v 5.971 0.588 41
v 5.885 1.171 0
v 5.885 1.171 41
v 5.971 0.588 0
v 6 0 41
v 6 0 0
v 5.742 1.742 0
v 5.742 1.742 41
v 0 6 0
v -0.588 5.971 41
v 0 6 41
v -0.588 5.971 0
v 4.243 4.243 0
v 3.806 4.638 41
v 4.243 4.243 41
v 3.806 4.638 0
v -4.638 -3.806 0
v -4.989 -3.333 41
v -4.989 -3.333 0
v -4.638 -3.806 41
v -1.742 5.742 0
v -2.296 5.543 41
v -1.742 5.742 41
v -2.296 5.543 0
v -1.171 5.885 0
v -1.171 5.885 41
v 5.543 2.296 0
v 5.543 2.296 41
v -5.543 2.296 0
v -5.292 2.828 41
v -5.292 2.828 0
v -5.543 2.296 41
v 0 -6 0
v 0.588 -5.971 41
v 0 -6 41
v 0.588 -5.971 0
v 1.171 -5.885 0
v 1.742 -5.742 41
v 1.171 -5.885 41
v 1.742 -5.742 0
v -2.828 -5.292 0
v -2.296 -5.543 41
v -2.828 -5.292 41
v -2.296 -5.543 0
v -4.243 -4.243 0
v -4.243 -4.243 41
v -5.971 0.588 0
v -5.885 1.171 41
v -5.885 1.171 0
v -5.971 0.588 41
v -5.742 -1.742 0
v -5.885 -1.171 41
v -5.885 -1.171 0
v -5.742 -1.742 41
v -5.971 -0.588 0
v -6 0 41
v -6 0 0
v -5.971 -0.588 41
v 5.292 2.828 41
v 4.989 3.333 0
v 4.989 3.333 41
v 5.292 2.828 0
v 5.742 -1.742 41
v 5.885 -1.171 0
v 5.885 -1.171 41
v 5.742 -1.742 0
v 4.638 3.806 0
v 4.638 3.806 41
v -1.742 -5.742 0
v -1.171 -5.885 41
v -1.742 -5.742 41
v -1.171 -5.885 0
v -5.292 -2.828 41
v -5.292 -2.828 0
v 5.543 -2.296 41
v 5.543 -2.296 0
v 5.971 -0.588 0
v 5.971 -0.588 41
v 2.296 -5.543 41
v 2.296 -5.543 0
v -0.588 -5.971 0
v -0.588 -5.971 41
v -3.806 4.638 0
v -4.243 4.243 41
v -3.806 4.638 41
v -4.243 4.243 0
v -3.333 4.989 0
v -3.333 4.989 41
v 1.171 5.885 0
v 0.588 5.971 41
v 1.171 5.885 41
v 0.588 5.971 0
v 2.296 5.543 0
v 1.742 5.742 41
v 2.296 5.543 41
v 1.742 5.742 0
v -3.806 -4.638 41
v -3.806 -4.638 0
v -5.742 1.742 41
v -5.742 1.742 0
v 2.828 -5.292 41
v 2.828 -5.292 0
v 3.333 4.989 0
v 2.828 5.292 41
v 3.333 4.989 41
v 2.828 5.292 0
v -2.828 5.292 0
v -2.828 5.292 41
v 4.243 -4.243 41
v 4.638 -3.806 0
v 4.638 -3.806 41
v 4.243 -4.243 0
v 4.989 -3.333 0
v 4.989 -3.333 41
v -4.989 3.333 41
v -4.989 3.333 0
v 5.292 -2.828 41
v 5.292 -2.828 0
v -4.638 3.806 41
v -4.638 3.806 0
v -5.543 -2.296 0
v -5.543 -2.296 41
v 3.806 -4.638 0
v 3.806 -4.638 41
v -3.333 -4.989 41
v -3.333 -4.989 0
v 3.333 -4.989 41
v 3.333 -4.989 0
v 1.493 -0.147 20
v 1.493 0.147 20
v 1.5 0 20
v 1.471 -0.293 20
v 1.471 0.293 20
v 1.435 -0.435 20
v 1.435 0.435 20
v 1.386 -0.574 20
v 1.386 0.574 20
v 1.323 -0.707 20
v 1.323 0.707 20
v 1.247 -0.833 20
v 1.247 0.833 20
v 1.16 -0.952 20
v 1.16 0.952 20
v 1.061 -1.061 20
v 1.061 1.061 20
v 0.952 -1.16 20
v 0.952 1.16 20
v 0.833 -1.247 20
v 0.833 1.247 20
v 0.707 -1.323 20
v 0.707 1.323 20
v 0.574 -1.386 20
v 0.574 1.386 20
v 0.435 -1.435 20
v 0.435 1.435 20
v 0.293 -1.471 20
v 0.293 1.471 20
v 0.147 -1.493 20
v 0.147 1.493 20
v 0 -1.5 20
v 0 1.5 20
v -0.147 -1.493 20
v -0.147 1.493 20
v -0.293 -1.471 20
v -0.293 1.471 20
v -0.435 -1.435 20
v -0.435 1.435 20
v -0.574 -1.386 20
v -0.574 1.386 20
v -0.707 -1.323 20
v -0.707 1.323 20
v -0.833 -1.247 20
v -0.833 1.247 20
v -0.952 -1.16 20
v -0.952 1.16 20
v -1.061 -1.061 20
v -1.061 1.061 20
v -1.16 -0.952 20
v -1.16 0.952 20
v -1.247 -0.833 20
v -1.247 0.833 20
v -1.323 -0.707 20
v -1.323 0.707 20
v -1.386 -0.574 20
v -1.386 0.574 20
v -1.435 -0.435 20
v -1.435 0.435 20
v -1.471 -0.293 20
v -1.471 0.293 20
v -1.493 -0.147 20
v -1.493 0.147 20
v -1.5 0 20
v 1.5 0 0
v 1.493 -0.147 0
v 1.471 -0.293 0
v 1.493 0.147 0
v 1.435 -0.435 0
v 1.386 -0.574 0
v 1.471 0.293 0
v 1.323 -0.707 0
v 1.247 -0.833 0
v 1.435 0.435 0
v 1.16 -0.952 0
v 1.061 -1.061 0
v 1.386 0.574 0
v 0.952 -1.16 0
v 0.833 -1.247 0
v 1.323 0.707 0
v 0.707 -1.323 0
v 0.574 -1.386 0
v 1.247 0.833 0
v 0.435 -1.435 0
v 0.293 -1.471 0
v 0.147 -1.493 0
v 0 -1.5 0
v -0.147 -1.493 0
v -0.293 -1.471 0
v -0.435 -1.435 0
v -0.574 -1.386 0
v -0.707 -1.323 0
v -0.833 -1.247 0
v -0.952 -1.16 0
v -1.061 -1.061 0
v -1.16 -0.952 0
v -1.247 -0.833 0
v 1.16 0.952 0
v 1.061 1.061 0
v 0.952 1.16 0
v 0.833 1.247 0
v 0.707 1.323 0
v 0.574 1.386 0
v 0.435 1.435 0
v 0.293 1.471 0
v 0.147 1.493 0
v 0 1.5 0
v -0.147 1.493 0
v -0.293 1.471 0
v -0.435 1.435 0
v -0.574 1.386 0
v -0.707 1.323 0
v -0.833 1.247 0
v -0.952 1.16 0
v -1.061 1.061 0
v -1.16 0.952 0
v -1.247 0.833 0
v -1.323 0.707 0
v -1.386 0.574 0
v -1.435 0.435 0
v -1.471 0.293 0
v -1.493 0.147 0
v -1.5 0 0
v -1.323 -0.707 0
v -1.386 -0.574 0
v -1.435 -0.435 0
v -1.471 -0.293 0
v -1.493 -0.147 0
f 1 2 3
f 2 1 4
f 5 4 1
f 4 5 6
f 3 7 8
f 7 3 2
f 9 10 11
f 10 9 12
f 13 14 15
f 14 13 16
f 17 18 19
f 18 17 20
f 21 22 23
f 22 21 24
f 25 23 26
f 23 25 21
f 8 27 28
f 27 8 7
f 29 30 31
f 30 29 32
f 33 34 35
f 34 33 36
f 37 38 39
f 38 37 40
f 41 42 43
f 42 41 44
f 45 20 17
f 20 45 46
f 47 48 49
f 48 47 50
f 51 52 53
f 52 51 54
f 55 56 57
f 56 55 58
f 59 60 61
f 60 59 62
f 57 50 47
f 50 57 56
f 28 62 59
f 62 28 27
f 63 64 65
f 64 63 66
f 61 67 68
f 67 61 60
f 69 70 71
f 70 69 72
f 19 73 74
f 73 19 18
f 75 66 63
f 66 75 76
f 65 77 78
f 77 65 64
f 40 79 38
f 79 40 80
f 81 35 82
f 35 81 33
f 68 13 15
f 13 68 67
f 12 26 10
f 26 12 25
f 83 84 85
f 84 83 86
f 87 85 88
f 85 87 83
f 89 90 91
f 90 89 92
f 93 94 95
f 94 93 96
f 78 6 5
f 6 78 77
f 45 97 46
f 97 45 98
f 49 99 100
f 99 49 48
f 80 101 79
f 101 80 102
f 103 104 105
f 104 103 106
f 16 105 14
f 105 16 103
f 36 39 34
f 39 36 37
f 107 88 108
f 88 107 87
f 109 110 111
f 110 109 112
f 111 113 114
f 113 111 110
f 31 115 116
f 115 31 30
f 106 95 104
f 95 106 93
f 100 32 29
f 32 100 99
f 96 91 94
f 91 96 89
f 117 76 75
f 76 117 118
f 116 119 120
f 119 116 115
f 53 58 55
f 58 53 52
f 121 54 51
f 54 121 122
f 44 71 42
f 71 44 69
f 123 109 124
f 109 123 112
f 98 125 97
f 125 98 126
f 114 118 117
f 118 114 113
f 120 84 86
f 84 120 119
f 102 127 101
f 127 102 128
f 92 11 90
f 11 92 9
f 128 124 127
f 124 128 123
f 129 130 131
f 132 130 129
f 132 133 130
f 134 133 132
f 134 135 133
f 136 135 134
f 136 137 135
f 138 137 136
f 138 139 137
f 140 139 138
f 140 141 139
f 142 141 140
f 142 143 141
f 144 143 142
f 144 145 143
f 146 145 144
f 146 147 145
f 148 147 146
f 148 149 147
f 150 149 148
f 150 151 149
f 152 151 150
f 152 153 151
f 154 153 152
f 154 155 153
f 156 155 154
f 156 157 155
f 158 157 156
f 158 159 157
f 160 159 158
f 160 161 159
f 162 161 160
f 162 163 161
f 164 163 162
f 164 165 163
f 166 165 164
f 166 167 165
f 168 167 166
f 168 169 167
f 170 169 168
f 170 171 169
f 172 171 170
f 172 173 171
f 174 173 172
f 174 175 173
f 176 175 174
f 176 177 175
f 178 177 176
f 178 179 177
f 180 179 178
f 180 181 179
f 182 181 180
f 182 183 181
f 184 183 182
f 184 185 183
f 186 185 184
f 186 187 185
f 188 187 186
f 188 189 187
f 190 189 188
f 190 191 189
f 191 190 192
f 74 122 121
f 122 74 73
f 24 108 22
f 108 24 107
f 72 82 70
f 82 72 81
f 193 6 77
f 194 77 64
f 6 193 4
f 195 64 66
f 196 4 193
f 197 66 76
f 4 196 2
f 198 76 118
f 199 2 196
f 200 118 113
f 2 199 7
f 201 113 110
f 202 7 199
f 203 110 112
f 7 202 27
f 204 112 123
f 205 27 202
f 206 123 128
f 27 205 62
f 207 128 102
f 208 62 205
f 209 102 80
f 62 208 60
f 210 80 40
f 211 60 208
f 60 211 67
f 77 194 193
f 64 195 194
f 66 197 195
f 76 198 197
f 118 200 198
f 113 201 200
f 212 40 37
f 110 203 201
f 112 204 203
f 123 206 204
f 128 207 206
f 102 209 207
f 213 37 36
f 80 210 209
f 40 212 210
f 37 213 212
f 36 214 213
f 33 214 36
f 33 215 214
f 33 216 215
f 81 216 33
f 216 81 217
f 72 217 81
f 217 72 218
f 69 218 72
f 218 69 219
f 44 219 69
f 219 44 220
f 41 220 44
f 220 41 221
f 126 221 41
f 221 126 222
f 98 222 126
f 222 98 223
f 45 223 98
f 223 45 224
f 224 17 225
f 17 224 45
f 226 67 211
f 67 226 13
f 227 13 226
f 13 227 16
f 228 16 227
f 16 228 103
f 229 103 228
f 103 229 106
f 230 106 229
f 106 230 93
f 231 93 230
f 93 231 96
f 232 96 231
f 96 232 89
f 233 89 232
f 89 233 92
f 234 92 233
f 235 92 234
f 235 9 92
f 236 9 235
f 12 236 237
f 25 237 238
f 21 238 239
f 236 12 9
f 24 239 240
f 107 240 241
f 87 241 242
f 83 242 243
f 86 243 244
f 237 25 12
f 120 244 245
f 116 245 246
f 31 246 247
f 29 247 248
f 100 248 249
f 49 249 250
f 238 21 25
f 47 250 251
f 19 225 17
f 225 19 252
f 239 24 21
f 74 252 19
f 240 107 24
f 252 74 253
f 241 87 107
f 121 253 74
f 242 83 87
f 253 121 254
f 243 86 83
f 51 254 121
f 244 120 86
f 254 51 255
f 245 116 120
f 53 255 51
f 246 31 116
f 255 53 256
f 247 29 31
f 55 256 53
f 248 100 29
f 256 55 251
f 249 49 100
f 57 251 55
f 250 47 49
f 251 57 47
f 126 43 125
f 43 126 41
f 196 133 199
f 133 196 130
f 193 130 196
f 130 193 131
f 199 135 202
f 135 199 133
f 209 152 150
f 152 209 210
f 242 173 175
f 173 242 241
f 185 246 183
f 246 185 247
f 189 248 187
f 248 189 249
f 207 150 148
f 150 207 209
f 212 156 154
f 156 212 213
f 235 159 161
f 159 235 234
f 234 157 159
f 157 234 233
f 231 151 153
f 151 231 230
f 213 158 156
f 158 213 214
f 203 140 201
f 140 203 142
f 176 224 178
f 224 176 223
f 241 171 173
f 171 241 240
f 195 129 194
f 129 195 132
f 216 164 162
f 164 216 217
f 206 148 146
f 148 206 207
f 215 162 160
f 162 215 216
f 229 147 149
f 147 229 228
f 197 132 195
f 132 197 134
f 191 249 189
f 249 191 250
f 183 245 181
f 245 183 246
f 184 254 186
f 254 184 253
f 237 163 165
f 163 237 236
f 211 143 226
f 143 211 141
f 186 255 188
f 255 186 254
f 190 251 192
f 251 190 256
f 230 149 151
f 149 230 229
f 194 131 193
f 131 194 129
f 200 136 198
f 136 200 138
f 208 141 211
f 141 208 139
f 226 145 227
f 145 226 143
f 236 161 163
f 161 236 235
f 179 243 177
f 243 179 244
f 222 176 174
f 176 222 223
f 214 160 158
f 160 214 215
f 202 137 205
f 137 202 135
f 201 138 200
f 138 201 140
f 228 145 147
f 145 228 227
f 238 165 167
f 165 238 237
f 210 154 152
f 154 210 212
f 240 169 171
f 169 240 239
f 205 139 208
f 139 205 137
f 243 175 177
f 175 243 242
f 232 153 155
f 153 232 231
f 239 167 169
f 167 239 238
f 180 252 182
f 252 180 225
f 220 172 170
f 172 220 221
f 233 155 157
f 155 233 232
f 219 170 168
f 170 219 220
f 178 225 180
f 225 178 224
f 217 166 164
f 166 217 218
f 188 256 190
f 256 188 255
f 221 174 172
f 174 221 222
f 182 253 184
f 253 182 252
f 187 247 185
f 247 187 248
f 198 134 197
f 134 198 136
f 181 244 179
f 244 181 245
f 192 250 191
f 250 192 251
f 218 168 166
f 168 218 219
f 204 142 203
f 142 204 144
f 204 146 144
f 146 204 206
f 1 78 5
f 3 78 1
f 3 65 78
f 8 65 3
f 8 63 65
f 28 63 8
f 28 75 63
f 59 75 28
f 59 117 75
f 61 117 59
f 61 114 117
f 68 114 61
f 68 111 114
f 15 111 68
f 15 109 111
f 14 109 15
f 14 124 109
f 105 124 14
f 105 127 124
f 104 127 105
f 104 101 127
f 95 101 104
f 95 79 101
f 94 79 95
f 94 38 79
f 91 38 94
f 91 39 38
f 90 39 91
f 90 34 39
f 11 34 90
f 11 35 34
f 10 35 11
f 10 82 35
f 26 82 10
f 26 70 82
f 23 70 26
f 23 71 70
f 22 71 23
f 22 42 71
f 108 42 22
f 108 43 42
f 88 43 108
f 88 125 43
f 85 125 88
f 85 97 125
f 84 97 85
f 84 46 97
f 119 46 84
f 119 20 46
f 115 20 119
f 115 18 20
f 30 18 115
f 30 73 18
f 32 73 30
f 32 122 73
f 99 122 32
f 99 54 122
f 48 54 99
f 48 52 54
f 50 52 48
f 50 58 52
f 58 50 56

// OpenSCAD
$fn = 64;

// Dimensions
bore_diameter = 3;
collar_diameter = 12;
collar_height = 5;
barb8_height = 10;
barb8_bottom_diameter = 7.5;
barb8_top_diameter = 9.5;
barb5_height = 8;
barb5_bottom_diameter = 6.5;
barb5_top_diameter = 5.0;
total_height = 41;

// Helper function to create a single sawtooth barb
module sawtooth_barb(bottom_diameter, top_diameter, height, z_offset) {
    half_height = height / 2;
    
    // Create the sawtooth profile using hull for the step transition
    hull() {
        // Bottom circle
        translate([0, 0, z_offset])
            circle(d = bottom_diameter, $fn = 64);
        
        // Top of first ramp (at half height)
        translate([0, 0, z_offset + half_height])
            circle(d = top_diameter, $fn = 64);
    }
    
    hull() {
        // Top of first ramp (at half height)
        translate([0, 0, z_offset + half_height])
            circle(d = top_diameter, $fn = 64);
        
        // Bottom circle at top of barb (step back)
        translate([0, 0, z_offset + height - 0.01])
            circle(d = bottom_diameter, $fn = 64);
    }
}

// Main body with bore
module main_body_with_bore() {
    // Base cylinder (from z=0 to z=20)
    difference() {
        cylinder(h = 20, d = 12, $fn = 64);
        translate([0, 0, -0.01])
            cylinder(h = 20.02, d = bore_diameter, $fn = 64);
    }
    
    // Collar section (z=20 to z=25)
    translate([0, 0, 20])
        cylinder(h = collar_height, d = collar_diameter, $fn = 64);
    
    // Top section (z=25 to z=41)
    translate([0, 0, 25])
        cylinder(h = 16, d = 12, $fn = 64);
}

// 8mm barbs (z=0 to z=20)
module barbs_8mm() {
    // First barb (bottom)
    translate([0, 0, 0])
        sawtooth_barb(barb8_bottom_diameter, barb8_top_diameter, barb8_height, 0);
    
    // Second barb (top)
    translate([0, 0, barb8_height])
        sawtooth_barb(barb8_bottom_diameter, barb8_top_diameter, barb8_height, 0);
}

// 5mm barbs (z=25 to z=41)
module barbs_5mm() {
    // First barb (bottom)
    translate([0, 0, 25])
        sawtooth_barb(barb5_bottom_diameter, barb5_top_diameter, barb5_height, 0);
    
    // Second barb (top)
    translate([0, 0, 25 + barb5_height])
        sawtooth_barb(barb5_bottom_diameter, barb5_top_diameter, barb5_height, 0);
}

// Combine everything
module reducer() {
    // Create main body with bore
    main_body_with_bore();
    
    // Add 8mm barbs
    barbs_8mm();
    
    // Add 5mm barbs
    barbs_5mm();
}

// Final part
reducer();
